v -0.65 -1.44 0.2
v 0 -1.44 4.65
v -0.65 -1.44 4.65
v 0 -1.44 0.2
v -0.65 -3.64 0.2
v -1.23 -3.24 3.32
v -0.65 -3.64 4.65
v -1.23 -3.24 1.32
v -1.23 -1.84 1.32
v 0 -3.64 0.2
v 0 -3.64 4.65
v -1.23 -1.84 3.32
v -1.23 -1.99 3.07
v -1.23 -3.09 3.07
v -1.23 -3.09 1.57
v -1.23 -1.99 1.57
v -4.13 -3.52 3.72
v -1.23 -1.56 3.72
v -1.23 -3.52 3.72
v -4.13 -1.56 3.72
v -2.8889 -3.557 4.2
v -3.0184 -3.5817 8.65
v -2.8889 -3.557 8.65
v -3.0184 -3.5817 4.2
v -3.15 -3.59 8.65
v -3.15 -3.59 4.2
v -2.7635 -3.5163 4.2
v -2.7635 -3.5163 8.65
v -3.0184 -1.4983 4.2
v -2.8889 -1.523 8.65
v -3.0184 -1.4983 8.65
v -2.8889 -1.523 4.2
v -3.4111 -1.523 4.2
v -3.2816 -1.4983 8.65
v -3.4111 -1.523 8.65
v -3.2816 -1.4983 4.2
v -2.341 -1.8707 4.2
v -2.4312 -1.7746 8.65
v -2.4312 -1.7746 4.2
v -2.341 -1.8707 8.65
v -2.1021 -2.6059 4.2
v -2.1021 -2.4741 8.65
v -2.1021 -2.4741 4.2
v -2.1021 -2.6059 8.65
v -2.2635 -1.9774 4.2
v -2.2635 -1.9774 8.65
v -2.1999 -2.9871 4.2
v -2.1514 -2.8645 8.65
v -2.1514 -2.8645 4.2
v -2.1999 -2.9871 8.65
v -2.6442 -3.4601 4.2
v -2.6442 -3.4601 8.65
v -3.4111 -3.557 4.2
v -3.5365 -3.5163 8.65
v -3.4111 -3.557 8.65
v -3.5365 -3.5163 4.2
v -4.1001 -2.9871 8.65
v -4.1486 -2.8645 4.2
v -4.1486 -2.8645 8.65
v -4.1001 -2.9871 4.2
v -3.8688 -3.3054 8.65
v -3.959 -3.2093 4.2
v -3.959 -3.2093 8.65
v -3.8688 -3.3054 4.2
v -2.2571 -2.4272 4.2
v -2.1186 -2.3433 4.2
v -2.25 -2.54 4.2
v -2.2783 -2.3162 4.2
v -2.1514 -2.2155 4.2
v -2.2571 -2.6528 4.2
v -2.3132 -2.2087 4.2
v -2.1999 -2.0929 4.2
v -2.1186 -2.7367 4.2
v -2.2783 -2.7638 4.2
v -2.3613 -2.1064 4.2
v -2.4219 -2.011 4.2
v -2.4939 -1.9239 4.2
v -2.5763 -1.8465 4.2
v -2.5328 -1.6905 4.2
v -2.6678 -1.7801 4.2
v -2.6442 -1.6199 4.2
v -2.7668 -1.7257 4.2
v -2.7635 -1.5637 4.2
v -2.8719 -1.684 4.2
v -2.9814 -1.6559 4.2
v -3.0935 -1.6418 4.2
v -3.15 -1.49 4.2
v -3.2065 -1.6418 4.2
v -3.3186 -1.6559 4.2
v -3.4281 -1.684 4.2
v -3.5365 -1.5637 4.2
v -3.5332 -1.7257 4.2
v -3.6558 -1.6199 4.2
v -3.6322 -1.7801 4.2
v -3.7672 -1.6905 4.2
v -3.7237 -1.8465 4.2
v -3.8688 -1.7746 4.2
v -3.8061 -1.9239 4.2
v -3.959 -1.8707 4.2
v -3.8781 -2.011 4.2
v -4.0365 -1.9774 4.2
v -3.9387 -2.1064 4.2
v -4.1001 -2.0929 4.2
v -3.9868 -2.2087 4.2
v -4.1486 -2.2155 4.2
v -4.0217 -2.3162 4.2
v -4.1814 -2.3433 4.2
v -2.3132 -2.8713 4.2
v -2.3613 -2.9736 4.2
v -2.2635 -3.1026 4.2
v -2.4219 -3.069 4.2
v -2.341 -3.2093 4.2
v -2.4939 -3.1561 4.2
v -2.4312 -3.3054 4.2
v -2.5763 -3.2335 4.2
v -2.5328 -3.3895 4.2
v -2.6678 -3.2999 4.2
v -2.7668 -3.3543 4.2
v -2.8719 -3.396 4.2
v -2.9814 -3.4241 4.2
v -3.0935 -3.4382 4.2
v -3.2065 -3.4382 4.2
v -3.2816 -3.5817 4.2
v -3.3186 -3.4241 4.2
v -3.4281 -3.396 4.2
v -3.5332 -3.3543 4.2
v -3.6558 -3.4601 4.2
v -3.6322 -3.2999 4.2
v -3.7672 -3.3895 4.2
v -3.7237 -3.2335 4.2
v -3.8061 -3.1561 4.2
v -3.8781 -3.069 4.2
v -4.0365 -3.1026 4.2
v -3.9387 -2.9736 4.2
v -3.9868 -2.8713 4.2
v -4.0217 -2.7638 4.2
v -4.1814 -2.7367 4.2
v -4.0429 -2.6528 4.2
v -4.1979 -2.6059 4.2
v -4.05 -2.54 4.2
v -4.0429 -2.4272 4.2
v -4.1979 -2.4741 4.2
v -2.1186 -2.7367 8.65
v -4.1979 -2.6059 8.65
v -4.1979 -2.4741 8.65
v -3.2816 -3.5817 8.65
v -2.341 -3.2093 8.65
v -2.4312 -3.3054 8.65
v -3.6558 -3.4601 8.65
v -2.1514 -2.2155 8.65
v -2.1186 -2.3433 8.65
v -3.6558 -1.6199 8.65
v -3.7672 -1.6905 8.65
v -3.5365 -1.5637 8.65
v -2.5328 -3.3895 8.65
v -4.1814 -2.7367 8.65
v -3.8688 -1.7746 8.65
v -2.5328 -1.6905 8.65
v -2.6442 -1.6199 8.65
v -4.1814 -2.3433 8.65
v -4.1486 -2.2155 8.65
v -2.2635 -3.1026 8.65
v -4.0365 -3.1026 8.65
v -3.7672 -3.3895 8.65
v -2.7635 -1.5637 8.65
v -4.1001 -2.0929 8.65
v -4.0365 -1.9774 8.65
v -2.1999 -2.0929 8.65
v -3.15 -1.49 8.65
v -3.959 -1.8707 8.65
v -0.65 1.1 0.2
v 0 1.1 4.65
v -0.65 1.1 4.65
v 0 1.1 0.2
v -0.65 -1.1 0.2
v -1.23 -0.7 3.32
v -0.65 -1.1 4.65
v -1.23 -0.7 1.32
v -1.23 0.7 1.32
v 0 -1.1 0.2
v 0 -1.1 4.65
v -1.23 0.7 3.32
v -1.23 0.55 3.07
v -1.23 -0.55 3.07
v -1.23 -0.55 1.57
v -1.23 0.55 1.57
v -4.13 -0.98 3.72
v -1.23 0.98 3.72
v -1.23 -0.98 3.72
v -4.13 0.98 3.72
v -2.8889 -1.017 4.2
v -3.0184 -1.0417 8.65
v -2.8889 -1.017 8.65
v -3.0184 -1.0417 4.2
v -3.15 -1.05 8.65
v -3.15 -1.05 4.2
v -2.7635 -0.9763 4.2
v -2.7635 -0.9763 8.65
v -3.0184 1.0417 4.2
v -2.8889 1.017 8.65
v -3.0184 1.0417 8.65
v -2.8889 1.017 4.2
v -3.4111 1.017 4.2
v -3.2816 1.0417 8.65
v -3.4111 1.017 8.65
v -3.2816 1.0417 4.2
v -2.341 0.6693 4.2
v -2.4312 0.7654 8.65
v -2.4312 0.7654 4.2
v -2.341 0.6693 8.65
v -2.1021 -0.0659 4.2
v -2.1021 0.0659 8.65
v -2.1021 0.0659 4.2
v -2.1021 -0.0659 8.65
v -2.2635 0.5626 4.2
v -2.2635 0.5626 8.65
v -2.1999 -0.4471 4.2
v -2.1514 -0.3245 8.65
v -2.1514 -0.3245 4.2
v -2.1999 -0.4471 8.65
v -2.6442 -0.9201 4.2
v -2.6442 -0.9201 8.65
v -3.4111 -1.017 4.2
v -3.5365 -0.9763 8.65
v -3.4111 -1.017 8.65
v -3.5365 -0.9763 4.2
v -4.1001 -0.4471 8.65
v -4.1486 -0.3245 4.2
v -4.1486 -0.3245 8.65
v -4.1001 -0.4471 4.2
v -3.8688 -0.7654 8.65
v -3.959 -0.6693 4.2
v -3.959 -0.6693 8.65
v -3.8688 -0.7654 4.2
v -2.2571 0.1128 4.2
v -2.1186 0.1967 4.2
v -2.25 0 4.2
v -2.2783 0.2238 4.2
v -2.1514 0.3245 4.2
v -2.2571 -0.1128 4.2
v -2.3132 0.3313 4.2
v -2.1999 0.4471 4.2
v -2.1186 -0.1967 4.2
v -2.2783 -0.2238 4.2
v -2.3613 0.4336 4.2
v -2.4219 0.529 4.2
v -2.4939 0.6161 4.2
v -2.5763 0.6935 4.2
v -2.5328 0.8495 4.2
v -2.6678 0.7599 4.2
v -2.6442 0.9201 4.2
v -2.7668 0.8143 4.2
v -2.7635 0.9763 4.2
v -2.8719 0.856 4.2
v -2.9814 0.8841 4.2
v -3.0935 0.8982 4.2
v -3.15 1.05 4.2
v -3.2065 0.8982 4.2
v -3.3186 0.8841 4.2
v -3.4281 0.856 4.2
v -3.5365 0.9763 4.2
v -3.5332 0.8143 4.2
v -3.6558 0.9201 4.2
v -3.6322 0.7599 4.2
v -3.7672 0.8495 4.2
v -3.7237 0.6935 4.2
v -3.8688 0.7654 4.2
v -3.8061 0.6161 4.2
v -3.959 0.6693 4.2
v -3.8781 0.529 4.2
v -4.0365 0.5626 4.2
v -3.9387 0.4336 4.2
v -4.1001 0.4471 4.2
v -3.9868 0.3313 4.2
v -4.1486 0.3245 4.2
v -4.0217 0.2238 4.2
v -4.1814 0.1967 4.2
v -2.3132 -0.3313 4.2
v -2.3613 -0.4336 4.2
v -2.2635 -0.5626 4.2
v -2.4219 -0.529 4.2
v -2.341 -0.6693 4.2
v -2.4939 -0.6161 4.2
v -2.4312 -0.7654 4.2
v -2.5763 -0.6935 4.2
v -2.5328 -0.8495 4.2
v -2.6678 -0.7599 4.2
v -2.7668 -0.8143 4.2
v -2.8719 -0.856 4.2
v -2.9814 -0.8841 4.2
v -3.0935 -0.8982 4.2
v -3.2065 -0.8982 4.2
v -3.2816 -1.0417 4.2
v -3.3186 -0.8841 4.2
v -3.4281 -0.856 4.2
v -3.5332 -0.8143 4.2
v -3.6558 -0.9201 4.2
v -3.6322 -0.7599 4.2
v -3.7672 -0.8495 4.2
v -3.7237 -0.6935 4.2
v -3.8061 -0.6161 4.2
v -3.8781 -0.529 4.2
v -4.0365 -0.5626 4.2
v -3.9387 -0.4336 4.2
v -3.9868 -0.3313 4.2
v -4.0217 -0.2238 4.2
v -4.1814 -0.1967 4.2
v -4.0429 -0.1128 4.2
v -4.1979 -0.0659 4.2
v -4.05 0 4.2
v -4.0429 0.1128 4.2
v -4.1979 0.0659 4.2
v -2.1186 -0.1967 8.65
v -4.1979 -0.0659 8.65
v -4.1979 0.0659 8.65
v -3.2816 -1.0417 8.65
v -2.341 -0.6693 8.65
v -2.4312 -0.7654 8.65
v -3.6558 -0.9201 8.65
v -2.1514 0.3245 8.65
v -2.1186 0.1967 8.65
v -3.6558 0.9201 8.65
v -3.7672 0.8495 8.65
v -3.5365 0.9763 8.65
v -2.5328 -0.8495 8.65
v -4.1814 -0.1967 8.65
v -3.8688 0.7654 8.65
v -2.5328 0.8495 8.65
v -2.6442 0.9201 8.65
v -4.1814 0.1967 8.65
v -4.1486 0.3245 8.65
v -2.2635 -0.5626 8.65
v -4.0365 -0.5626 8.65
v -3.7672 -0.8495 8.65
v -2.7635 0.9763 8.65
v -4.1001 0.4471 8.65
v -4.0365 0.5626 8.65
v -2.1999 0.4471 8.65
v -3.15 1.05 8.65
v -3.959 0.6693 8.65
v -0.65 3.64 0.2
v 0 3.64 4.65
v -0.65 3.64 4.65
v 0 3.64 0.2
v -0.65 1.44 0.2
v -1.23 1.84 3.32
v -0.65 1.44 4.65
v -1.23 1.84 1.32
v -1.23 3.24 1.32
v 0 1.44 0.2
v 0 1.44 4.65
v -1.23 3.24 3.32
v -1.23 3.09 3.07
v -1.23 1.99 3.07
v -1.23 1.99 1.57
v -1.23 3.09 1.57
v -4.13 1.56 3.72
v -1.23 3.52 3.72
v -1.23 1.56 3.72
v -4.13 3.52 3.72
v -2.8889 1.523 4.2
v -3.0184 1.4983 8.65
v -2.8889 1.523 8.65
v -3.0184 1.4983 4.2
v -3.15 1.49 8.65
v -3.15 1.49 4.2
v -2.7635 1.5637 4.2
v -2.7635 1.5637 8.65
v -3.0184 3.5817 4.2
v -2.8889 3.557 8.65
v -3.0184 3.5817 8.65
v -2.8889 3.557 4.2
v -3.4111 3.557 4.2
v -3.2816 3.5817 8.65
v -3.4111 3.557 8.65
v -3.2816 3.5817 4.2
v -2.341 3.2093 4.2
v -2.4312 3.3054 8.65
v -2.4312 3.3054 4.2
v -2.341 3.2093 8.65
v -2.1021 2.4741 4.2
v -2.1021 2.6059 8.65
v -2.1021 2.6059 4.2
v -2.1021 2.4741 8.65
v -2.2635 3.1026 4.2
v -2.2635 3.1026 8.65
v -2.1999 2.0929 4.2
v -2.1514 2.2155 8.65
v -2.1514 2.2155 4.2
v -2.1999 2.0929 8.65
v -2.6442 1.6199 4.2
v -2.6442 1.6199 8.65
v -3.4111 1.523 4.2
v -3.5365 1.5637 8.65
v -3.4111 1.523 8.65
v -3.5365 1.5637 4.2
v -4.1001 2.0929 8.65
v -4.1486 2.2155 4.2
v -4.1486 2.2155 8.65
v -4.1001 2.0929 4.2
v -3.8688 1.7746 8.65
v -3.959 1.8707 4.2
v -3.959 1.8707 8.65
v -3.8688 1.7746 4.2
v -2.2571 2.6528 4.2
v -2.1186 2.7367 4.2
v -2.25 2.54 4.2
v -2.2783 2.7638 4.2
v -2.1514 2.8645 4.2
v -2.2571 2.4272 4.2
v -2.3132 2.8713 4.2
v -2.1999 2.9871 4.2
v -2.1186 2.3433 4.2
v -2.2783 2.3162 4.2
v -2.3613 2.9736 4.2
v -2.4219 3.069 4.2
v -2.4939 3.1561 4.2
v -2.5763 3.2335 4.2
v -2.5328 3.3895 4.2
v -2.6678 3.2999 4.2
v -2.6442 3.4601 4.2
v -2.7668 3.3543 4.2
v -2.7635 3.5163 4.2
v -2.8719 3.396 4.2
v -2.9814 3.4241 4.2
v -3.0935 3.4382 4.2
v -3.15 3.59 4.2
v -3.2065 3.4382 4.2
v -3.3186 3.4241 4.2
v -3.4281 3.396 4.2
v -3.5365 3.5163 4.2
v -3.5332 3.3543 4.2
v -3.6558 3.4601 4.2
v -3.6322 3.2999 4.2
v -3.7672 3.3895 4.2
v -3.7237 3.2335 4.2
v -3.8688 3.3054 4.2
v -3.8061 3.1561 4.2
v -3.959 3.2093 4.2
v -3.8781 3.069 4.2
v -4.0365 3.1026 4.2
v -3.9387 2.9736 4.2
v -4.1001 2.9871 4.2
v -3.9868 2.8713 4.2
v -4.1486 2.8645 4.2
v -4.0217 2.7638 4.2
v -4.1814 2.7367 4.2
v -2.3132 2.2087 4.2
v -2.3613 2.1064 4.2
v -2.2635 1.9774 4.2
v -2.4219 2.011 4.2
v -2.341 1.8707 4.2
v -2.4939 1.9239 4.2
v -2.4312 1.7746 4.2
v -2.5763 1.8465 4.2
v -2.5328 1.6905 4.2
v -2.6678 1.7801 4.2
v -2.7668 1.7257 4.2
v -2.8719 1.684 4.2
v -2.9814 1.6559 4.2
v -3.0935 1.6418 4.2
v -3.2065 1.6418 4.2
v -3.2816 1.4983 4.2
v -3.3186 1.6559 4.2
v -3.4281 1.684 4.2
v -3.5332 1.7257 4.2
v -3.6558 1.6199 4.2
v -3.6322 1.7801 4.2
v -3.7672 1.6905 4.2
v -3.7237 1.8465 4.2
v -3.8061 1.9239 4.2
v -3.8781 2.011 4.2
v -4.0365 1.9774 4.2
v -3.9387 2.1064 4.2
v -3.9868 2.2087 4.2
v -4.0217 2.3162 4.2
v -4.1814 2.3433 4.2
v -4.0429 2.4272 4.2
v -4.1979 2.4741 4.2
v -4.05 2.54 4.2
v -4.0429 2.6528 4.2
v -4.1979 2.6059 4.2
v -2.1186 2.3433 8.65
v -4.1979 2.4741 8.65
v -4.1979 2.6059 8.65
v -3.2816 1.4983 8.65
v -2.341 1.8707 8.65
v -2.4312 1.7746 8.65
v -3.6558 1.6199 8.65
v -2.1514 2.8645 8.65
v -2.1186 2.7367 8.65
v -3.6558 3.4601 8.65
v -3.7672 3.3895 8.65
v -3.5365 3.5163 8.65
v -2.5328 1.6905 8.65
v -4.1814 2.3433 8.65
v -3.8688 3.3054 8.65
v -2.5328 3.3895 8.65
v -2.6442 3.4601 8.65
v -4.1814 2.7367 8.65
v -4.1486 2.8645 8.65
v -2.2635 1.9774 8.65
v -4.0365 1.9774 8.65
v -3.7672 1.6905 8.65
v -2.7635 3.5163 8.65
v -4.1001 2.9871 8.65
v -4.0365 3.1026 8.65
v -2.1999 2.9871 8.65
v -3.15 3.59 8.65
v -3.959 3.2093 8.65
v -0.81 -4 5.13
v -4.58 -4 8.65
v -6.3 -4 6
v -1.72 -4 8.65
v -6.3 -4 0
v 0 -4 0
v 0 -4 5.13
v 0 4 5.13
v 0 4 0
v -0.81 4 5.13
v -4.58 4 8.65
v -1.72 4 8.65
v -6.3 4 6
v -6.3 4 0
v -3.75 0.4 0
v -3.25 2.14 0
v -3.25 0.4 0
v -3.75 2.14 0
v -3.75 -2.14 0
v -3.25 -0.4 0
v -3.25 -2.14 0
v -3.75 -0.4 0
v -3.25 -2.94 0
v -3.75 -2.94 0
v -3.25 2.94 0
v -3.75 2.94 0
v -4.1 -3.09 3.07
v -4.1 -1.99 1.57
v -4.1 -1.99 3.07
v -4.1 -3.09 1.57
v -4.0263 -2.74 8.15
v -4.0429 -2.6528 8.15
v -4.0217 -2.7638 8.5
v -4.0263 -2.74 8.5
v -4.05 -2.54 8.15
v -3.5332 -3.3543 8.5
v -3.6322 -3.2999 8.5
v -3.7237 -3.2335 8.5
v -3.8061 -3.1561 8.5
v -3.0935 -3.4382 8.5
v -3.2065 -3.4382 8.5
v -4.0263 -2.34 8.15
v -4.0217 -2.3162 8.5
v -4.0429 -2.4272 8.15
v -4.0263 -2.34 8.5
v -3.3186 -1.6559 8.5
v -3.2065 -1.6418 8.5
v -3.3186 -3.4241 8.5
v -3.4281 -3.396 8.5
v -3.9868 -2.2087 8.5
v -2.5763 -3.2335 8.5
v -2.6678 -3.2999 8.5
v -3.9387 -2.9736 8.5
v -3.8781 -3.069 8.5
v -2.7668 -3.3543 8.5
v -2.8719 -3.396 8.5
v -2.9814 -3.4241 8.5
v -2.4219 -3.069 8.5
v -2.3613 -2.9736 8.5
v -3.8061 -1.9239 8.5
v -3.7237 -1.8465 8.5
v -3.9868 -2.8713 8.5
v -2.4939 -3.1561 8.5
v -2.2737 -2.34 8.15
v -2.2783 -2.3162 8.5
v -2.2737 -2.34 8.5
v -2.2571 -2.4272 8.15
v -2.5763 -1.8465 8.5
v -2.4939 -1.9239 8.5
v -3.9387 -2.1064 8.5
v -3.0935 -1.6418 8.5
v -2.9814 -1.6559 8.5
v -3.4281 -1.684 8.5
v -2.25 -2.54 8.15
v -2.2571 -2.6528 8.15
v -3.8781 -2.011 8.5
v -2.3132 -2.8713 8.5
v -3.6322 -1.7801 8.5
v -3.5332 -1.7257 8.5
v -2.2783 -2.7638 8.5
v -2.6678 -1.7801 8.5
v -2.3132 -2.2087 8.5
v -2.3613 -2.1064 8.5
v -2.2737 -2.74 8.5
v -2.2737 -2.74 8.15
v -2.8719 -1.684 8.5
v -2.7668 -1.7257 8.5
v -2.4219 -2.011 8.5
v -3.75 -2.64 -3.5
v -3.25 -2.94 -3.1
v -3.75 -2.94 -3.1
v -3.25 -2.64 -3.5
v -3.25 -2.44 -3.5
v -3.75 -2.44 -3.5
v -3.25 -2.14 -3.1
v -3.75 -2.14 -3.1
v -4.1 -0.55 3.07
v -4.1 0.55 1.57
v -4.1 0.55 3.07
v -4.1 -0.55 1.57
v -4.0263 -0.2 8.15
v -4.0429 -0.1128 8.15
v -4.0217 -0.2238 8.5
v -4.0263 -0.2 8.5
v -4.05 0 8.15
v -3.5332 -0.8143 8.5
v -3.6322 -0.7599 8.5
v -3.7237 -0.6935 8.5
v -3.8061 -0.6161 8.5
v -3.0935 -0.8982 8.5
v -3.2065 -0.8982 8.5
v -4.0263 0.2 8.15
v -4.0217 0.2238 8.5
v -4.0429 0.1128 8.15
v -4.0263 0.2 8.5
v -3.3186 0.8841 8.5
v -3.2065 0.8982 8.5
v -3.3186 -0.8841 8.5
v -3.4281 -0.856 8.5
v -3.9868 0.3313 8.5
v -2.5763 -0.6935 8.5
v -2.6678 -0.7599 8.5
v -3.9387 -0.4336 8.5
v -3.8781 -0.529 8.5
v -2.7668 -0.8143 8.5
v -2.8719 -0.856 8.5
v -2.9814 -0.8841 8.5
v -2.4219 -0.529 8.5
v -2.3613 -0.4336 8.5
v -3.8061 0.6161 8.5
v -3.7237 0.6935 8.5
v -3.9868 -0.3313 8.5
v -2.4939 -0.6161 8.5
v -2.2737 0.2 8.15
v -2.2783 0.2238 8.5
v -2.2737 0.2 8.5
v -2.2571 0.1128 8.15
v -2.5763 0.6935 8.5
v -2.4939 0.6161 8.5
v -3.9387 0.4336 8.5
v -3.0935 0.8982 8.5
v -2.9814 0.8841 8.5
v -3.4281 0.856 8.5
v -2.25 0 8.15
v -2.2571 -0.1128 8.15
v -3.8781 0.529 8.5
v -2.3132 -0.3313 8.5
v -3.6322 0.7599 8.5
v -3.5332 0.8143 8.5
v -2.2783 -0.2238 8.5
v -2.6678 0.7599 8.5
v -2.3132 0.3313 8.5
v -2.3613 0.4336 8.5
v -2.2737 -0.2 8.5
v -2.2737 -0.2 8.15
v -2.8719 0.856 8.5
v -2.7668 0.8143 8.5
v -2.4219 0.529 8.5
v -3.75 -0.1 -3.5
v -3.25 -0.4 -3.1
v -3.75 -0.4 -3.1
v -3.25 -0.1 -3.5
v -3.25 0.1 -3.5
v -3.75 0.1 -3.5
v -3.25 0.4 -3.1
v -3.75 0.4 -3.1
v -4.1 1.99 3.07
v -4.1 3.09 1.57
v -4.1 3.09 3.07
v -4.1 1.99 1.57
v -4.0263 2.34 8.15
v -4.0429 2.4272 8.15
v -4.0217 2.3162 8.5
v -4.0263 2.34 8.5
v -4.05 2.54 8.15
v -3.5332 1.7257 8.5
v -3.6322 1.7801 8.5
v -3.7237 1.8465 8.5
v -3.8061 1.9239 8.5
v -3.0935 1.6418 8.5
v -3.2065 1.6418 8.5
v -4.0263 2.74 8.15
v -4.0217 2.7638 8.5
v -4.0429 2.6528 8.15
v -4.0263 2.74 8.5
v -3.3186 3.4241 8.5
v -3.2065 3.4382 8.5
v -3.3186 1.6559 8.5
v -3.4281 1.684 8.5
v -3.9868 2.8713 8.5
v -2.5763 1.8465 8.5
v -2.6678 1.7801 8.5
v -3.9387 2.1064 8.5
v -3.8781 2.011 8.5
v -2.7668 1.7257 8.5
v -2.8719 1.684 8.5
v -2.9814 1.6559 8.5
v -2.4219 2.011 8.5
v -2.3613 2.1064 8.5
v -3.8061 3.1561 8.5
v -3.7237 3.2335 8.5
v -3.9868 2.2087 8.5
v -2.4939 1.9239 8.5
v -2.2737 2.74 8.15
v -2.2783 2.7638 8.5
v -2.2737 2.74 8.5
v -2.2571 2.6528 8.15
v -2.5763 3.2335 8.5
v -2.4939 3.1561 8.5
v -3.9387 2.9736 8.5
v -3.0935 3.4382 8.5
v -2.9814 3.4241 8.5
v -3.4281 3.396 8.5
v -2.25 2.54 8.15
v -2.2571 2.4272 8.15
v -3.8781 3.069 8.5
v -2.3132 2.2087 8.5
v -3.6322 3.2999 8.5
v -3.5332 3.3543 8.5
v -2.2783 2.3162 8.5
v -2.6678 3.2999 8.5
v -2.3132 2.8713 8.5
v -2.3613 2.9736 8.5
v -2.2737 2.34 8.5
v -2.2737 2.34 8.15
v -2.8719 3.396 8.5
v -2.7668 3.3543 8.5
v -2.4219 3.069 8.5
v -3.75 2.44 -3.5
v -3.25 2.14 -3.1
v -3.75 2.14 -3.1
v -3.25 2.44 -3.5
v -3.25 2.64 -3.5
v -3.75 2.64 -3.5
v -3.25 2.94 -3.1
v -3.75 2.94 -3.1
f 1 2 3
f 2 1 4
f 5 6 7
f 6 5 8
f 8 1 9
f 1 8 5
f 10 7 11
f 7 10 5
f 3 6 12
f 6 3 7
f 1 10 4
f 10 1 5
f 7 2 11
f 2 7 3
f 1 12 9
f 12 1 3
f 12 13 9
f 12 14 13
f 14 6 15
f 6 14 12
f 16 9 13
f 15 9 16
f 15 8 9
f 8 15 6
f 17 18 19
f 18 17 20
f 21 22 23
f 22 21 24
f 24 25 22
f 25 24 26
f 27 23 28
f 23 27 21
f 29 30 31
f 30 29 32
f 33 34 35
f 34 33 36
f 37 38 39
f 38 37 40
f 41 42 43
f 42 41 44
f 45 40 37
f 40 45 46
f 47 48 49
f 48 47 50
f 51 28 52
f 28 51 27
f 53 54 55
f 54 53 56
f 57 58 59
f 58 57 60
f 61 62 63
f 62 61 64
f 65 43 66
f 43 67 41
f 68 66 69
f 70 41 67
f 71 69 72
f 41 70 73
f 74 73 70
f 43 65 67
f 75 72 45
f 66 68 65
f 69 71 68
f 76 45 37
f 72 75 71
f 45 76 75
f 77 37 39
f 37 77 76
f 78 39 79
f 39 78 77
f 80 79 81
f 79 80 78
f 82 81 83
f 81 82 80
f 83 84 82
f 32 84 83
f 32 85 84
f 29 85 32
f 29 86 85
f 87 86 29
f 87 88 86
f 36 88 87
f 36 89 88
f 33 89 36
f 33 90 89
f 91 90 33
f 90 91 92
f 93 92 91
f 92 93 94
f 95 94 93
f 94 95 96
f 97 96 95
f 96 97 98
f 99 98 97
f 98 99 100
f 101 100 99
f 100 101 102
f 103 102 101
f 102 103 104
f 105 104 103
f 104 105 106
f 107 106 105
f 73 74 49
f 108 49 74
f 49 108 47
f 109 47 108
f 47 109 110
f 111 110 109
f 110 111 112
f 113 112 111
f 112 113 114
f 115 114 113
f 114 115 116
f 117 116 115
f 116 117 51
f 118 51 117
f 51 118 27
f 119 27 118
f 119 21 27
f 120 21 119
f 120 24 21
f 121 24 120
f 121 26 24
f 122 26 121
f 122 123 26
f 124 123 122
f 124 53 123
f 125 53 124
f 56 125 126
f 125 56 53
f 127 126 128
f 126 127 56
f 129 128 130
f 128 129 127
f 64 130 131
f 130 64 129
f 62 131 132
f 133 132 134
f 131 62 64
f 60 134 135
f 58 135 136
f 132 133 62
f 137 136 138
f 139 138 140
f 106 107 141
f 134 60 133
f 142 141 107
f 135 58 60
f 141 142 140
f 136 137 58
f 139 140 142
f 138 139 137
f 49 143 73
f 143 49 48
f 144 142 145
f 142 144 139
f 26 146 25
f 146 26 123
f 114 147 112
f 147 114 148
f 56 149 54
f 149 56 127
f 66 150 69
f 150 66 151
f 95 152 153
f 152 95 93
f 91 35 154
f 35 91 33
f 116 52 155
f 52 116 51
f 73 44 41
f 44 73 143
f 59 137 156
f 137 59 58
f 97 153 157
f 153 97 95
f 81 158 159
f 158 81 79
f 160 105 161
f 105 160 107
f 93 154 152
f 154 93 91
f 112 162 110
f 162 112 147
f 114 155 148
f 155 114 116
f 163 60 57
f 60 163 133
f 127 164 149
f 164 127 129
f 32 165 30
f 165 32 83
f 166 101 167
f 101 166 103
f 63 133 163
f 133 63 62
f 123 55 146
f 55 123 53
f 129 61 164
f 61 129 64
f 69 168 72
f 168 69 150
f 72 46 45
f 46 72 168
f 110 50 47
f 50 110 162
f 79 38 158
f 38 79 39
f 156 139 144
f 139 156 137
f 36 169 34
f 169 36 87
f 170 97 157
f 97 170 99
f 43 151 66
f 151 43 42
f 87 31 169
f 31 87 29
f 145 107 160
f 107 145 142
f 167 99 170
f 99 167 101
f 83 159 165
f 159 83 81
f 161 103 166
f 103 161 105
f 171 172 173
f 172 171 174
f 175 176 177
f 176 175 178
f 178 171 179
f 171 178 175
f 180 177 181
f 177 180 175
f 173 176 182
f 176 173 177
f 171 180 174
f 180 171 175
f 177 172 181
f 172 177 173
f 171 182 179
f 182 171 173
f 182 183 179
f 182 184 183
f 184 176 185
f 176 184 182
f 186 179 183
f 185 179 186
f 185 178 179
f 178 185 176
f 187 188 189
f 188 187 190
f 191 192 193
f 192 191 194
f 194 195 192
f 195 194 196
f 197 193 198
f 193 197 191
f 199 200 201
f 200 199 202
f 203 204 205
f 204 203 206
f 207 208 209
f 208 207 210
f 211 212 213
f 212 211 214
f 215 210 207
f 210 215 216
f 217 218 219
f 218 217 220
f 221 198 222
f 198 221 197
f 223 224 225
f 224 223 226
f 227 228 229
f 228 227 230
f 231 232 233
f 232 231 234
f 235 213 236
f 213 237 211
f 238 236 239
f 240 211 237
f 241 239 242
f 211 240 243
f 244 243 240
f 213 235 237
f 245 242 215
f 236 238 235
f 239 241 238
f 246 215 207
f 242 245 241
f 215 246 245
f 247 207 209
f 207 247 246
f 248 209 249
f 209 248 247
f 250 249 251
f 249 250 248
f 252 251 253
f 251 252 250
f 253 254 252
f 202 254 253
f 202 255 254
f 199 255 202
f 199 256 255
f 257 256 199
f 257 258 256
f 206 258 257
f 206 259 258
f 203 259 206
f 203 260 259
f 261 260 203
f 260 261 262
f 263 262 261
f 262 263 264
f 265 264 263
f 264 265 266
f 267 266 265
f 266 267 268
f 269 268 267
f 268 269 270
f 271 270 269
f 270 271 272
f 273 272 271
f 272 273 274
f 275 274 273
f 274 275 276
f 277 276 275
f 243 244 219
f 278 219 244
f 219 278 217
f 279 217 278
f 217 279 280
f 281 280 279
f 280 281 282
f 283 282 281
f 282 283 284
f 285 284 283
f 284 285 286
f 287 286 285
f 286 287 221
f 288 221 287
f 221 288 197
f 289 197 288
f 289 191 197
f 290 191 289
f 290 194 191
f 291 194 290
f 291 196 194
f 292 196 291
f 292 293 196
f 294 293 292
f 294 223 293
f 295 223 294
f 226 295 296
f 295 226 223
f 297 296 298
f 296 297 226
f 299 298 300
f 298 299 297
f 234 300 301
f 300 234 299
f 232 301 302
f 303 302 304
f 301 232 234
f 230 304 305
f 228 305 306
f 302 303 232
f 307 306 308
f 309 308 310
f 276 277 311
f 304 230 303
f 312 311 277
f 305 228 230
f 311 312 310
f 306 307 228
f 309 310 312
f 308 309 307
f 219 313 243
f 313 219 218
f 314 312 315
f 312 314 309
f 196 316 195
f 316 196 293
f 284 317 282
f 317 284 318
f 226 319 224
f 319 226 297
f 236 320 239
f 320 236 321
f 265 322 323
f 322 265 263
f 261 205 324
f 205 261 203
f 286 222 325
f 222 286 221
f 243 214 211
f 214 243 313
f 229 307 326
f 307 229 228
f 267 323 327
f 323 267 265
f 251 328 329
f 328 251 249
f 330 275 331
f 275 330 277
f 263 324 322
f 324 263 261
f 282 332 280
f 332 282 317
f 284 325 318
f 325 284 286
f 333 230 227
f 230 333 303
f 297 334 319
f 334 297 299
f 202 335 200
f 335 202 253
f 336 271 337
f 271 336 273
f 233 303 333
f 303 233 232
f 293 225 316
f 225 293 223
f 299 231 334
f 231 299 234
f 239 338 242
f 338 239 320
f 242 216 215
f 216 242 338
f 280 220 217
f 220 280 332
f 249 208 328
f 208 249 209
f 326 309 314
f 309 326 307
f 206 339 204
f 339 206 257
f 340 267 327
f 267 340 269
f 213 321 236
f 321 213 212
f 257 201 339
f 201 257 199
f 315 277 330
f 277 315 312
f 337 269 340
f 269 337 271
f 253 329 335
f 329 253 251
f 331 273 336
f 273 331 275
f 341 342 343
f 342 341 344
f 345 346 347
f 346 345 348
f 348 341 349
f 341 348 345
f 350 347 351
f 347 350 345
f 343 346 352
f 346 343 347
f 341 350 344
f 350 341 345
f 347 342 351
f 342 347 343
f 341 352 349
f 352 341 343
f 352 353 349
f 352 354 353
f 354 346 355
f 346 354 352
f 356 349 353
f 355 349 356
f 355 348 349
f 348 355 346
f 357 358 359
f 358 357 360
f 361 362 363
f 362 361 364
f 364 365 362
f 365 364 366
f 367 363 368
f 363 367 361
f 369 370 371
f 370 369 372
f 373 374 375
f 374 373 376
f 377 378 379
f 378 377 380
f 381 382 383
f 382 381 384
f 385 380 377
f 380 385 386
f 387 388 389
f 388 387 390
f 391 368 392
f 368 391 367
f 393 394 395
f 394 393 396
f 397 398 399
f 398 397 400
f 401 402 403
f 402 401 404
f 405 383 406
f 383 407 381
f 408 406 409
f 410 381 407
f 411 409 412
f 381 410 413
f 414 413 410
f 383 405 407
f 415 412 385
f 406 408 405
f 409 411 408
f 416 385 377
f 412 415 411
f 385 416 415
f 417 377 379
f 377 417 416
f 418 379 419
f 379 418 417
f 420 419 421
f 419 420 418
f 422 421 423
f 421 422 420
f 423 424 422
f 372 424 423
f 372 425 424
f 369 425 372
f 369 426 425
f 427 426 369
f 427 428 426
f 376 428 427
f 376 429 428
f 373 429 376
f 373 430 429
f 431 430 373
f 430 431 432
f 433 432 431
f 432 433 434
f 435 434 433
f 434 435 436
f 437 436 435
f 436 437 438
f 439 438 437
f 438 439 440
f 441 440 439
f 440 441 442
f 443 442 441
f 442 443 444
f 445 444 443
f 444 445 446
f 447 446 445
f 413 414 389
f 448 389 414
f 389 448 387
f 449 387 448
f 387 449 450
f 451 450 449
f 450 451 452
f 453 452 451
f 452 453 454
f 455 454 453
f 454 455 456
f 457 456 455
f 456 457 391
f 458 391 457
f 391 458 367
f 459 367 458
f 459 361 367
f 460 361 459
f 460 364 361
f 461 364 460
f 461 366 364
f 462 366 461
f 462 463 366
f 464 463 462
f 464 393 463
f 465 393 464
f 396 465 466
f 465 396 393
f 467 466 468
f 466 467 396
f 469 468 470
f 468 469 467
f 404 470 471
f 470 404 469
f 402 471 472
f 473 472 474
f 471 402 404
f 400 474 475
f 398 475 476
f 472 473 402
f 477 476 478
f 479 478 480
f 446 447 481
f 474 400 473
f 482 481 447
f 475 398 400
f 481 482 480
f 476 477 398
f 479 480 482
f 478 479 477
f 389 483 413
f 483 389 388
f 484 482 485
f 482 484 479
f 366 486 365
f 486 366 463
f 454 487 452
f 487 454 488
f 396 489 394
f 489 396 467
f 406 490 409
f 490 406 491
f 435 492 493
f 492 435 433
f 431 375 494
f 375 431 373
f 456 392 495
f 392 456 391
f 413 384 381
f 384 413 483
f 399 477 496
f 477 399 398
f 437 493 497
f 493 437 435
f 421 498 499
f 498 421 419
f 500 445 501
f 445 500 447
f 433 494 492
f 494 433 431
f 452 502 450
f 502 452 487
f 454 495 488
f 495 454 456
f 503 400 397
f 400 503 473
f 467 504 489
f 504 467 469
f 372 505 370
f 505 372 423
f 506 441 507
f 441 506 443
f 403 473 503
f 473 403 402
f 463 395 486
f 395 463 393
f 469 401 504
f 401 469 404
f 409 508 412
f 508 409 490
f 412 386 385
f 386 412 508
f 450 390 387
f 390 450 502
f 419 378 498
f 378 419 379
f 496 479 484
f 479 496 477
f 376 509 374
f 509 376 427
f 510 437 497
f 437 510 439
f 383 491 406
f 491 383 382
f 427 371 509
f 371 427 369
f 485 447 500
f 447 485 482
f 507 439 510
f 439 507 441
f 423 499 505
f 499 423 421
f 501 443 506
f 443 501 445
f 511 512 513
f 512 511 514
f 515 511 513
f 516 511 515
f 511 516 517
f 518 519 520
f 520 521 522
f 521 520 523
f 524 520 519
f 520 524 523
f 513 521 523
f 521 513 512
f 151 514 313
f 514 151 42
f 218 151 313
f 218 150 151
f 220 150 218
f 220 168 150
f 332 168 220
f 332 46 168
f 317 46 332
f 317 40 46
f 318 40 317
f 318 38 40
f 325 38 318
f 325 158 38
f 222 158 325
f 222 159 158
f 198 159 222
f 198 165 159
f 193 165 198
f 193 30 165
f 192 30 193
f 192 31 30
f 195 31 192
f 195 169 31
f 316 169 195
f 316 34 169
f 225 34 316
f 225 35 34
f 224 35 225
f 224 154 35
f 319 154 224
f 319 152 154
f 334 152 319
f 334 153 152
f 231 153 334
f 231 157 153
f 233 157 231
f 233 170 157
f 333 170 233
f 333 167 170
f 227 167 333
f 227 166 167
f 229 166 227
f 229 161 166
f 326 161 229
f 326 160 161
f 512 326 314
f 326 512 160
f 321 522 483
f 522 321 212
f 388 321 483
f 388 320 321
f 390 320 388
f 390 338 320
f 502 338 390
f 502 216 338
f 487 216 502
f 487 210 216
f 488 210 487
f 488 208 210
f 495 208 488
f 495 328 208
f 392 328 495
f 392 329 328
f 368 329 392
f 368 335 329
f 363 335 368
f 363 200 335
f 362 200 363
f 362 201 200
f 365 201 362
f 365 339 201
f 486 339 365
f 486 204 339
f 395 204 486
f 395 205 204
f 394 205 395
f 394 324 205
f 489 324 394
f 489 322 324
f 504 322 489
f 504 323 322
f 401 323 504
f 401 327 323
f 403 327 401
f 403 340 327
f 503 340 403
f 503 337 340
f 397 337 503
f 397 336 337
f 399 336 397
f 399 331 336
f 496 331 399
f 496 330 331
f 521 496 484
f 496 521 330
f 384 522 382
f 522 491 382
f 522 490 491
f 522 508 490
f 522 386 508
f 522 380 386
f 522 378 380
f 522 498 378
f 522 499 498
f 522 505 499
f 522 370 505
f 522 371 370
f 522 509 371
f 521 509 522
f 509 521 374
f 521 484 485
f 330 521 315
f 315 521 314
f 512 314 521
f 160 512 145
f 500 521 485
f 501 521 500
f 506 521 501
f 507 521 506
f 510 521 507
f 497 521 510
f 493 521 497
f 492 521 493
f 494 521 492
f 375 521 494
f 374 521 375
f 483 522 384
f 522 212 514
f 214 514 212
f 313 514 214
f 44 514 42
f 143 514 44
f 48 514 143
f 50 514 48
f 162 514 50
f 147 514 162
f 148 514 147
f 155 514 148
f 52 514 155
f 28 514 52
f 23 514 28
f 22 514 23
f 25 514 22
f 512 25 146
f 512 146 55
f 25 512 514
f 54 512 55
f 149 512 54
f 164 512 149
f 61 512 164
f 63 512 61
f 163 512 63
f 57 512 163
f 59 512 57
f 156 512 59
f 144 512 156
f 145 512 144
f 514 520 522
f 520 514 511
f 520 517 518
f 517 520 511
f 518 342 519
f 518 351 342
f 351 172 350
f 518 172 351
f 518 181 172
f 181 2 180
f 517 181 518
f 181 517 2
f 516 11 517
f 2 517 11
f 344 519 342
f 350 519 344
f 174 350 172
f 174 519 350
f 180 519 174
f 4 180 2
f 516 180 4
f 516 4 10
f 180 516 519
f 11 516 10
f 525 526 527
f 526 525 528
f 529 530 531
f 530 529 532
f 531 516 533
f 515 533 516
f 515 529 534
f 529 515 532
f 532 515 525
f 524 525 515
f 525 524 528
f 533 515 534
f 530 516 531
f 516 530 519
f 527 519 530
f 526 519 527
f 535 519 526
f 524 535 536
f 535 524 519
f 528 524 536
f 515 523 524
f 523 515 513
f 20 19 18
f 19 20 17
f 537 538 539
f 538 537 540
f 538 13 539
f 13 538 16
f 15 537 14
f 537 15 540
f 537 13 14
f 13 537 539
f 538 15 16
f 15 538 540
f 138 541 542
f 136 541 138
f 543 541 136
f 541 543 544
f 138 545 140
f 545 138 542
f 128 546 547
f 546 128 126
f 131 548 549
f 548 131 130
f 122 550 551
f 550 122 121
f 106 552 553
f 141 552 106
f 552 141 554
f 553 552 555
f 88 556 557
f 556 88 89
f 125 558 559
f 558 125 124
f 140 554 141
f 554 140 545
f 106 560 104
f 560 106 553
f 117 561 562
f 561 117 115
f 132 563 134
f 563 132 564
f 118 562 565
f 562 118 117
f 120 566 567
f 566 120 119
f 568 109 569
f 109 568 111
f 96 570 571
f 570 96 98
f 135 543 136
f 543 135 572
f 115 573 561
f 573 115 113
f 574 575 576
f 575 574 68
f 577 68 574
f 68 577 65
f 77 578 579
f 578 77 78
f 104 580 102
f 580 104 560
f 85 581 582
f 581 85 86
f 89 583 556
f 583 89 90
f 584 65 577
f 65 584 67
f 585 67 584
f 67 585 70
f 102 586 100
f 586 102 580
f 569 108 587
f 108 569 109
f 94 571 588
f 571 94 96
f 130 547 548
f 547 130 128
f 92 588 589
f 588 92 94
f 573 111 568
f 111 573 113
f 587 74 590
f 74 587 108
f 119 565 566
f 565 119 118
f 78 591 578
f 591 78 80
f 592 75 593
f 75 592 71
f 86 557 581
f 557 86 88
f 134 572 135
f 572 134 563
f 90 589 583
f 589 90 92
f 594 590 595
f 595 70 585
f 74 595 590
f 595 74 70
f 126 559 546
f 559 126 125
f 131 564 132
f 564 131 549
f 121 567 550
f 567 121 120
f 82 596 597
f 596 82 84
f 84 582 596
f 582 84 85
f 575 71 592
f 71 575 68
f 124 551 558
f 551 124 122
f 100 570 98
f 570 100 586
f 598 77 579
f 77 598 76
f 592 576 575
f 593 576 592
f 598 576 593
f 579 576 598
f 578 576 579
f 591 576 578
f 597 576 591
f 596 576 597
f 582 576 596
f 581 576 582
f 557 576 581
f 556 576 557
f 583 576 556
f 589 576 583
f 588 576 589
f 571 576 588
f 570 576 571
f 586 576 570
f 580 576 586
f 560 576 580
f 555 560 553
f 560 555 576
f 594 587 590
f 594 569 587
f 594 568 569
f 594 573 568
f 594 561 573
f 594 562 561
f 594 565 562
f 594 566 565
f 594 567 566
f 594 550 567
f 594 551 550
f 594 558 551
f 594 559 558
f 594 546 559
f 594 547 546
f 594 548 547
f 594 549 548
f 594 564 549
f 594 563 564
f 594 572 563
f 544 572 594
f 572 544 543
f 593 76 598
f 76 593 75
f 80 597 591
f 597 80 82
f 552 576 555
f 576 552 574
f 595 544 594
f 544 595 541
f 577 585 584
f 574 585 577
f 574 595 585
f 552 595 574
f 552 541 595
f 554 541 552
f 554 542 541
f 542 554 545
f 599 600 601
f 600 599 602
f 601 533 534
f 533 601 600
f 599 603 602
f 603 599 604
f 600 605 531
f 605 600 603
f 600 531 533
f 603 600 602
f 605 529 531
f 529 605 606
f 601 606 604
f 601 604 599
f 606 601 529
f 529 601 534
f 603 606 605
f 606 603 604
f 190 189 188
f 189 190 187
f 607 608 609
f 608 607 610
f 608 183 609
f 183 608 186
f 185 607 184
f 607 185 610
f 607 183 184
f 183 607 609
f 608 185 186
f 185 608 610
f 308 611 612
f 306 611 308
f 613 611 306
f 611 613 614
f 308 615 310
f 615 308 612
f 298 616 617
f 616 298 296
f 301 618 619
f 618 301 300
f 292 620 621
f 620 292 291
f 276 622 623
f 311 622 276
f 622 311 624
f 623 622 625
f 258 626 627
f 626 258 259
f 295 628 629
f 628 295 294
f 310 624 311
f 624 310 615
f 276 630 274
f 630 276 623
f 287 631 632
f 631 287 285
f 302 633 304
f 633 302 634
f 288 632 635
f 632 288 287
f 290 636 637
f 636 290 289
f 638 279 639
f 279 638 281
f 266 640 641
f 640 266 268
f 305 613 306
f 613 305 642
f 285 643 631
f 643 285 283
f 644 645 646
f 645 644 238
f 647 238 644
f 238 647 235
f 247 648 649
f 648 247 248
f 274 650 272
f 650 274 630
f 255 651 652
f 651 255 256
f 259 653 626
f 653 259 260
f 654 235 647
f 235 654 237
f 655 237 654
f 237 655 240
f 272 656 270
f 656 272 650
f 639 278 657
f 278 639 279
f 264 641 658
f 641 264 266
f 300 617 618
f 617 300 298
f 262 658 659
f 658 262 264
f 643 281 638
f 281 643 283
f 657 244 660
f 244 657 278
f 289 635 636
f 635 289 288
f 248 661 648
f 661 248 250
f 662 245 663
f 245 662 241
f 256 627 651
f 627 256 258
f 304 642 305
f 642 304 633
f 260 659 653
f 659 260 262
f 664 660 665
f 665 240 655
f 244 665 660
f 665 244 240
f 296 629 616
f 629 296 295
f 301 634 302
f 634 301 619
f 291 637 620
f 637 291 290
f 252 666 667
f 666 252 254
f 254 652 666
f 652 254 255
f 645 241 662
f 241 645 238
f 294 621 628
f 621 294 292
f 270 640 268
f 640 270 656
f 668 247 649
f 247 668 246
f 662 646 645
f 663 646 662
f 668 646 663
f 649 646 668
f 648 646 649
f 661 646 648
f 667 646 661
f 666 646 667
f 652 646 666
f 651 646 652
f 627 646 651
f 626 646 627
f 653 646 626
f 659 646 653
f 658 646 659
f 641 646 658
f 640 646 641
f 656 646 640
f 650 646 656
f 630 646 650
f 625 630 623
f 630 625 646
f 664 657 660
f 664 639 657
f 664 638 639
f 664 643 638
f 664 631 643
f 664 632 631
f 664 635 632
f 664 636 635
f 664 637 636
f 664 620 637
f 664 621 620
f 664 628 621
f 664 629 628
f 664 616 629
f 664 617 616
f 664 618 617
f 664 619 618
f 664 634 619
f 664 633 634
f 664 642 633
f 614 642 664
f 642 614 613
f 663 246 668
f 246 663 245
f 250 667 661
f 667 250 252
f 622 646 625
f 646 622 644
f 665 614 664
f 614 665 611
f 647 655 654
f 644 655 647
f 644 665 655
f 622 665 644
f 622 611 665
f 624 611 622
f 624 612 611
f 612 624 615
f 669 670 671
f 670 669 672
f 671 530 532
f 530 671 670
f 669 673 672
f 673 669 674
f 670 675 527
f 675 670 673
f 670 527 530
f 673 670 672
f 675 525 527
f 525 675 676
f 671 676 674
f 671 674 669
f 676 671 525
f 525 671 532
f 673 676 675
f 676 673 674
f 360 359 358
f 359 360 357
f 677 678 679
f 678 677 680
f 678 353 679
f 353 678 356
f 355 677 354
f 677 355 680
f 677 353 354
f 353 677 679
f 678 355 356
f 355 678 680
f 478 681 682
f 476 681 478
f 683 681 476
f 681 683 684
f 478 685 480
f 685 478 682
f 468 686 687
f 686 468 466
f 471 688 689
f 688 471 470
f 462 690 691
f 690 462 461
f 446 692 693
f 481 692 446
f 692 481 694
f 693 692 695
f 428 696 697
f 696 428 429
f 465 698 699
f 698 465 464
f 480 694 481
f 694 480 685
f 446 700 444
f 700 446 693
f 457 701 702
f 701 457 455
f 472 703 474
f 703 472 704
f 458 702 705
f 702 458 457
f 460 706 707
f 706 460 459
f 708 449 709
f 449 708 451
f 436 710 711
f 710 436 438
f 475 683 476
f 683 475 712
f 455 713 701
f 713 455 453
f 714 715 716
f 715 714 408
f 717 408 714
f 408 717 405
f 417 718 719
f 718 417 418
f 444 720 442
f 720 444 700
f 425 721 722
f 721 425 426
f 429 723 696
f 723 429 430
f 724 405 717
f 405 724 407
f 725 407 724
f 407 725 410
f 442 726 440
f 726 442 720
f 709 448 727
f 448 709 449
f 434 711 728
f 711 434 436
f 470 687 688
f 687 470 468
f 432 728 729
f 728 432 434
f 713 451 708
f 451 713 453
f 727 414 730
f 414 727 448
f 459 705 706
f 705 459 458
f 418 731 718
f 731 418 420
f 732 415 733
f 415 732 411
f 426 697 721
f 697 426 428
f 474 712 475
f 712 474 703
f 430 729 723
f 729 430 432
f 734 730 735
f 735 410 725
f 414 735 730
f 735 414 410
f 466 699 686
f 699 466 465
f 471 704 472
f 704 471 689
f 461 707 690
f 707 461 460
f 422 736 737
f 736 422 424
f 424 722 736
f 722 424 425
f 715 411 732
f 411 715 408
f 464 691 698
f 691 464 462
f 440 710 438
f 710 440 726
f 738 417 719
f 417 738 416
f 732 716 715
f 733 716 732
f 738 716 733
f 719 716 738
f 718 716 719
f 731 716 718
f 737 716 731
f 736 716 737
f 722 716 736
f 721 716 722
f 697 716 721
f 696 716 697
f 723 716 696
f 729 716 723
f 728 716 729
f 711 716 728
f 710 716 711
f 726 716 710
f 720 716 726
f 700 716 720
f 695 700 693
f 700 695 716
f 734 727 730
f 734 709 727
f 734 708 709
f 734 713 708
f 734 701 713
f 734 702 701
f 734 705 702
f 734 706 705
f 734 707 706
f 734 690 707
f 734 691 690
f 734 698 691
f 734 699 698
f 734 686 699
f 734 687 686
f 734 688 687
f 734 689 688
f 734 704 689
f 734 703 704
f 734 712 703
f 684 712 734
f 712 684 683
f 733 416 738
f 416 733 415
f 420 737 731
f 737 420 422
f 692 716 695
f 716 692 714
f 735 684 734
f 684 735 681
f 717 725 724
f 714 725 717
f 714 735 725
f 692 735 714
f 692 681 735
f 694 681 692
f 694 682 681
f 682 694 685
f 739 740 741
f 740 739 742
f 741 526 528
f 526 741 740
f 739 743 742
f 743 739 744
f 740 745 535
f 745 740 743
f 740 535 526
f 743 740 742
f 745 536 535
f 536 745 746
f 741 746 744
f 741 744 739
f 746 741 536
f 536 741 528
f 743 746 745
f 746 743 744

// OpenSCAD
$fn = 50;

ports = 3;

b = 2.54 * (ports - 1);
a = 2.92 + b;

translate([0, -b / 2, 0])
rotate([90, 0, 180])
{
  color([0.4, 0.4, 0.4])
  difference() {
    translate([0, 0, -1.46])
    linear_extrude(a)
    polygon([[0, 0],
             [0, 5.13],
             [0.81, 5.13],
             [1.72, 8.65],
             [4.58, 8.65],
             [6.3, 6],
             [6.3, 0]]);

    for (n = [0 : (ports - 1)])
    translate([0, 0.2, 2.54 * n])
    rotate([0, 90, 0])
    union() {
      hull() {
        translate([0, 4.45 / 2, 0.25])
        cube([2.2, 4.45, 0.8], center = true);

        translate([0, 2.12, 0.7 + (0.53 / 2)])
        cube([1.4, 2, 0.53], center = true);
      }

      translate([0, 2.12, 1])
      cube([1.4, 2, 2], center = true);

      translate([0, 2.12, 2.68])
      cube([1.96, 2.8, 2.9], center = true);

      translate([0, 4, 3.15])
      rotate([-90, 0, 0])
      cylinder(5, r = 1.05);
    }
  }

  color([0.8, 0.82, 0.94])
  for (n = [0 : (ports - 1)])
  translate([0, 0, 2.54 * n])
  union() {
    difference() {
      translate([2.68, 2.32, 0])
      cube([2.9, 2.8, 1.96], center = true);

      translate([4.1 / 2, 2.32, 0])
      cube([4.1, 1.5, 1.1], center = true);
    }

    difference() {
      translate([3.15, 4.2, 0])
      rotate([-90, 0, 0])
      cylinder(4.3, r = .9);

      translate([3.15, 8.55, 0])
      cube([2, 0.8, 0.4], center = true);
    }

    translate([3.25, 0, 0])
    rotate([0, 90, 0])
    linear_extrude(0.5)
    polygon([[-0.4, 0],
             [-0.4, -3.1],
             [-0.1, -3.5],
             [0.1, -3.5],
             [0.4, -3.1],
             [0.4, 0]]);
  }
}
